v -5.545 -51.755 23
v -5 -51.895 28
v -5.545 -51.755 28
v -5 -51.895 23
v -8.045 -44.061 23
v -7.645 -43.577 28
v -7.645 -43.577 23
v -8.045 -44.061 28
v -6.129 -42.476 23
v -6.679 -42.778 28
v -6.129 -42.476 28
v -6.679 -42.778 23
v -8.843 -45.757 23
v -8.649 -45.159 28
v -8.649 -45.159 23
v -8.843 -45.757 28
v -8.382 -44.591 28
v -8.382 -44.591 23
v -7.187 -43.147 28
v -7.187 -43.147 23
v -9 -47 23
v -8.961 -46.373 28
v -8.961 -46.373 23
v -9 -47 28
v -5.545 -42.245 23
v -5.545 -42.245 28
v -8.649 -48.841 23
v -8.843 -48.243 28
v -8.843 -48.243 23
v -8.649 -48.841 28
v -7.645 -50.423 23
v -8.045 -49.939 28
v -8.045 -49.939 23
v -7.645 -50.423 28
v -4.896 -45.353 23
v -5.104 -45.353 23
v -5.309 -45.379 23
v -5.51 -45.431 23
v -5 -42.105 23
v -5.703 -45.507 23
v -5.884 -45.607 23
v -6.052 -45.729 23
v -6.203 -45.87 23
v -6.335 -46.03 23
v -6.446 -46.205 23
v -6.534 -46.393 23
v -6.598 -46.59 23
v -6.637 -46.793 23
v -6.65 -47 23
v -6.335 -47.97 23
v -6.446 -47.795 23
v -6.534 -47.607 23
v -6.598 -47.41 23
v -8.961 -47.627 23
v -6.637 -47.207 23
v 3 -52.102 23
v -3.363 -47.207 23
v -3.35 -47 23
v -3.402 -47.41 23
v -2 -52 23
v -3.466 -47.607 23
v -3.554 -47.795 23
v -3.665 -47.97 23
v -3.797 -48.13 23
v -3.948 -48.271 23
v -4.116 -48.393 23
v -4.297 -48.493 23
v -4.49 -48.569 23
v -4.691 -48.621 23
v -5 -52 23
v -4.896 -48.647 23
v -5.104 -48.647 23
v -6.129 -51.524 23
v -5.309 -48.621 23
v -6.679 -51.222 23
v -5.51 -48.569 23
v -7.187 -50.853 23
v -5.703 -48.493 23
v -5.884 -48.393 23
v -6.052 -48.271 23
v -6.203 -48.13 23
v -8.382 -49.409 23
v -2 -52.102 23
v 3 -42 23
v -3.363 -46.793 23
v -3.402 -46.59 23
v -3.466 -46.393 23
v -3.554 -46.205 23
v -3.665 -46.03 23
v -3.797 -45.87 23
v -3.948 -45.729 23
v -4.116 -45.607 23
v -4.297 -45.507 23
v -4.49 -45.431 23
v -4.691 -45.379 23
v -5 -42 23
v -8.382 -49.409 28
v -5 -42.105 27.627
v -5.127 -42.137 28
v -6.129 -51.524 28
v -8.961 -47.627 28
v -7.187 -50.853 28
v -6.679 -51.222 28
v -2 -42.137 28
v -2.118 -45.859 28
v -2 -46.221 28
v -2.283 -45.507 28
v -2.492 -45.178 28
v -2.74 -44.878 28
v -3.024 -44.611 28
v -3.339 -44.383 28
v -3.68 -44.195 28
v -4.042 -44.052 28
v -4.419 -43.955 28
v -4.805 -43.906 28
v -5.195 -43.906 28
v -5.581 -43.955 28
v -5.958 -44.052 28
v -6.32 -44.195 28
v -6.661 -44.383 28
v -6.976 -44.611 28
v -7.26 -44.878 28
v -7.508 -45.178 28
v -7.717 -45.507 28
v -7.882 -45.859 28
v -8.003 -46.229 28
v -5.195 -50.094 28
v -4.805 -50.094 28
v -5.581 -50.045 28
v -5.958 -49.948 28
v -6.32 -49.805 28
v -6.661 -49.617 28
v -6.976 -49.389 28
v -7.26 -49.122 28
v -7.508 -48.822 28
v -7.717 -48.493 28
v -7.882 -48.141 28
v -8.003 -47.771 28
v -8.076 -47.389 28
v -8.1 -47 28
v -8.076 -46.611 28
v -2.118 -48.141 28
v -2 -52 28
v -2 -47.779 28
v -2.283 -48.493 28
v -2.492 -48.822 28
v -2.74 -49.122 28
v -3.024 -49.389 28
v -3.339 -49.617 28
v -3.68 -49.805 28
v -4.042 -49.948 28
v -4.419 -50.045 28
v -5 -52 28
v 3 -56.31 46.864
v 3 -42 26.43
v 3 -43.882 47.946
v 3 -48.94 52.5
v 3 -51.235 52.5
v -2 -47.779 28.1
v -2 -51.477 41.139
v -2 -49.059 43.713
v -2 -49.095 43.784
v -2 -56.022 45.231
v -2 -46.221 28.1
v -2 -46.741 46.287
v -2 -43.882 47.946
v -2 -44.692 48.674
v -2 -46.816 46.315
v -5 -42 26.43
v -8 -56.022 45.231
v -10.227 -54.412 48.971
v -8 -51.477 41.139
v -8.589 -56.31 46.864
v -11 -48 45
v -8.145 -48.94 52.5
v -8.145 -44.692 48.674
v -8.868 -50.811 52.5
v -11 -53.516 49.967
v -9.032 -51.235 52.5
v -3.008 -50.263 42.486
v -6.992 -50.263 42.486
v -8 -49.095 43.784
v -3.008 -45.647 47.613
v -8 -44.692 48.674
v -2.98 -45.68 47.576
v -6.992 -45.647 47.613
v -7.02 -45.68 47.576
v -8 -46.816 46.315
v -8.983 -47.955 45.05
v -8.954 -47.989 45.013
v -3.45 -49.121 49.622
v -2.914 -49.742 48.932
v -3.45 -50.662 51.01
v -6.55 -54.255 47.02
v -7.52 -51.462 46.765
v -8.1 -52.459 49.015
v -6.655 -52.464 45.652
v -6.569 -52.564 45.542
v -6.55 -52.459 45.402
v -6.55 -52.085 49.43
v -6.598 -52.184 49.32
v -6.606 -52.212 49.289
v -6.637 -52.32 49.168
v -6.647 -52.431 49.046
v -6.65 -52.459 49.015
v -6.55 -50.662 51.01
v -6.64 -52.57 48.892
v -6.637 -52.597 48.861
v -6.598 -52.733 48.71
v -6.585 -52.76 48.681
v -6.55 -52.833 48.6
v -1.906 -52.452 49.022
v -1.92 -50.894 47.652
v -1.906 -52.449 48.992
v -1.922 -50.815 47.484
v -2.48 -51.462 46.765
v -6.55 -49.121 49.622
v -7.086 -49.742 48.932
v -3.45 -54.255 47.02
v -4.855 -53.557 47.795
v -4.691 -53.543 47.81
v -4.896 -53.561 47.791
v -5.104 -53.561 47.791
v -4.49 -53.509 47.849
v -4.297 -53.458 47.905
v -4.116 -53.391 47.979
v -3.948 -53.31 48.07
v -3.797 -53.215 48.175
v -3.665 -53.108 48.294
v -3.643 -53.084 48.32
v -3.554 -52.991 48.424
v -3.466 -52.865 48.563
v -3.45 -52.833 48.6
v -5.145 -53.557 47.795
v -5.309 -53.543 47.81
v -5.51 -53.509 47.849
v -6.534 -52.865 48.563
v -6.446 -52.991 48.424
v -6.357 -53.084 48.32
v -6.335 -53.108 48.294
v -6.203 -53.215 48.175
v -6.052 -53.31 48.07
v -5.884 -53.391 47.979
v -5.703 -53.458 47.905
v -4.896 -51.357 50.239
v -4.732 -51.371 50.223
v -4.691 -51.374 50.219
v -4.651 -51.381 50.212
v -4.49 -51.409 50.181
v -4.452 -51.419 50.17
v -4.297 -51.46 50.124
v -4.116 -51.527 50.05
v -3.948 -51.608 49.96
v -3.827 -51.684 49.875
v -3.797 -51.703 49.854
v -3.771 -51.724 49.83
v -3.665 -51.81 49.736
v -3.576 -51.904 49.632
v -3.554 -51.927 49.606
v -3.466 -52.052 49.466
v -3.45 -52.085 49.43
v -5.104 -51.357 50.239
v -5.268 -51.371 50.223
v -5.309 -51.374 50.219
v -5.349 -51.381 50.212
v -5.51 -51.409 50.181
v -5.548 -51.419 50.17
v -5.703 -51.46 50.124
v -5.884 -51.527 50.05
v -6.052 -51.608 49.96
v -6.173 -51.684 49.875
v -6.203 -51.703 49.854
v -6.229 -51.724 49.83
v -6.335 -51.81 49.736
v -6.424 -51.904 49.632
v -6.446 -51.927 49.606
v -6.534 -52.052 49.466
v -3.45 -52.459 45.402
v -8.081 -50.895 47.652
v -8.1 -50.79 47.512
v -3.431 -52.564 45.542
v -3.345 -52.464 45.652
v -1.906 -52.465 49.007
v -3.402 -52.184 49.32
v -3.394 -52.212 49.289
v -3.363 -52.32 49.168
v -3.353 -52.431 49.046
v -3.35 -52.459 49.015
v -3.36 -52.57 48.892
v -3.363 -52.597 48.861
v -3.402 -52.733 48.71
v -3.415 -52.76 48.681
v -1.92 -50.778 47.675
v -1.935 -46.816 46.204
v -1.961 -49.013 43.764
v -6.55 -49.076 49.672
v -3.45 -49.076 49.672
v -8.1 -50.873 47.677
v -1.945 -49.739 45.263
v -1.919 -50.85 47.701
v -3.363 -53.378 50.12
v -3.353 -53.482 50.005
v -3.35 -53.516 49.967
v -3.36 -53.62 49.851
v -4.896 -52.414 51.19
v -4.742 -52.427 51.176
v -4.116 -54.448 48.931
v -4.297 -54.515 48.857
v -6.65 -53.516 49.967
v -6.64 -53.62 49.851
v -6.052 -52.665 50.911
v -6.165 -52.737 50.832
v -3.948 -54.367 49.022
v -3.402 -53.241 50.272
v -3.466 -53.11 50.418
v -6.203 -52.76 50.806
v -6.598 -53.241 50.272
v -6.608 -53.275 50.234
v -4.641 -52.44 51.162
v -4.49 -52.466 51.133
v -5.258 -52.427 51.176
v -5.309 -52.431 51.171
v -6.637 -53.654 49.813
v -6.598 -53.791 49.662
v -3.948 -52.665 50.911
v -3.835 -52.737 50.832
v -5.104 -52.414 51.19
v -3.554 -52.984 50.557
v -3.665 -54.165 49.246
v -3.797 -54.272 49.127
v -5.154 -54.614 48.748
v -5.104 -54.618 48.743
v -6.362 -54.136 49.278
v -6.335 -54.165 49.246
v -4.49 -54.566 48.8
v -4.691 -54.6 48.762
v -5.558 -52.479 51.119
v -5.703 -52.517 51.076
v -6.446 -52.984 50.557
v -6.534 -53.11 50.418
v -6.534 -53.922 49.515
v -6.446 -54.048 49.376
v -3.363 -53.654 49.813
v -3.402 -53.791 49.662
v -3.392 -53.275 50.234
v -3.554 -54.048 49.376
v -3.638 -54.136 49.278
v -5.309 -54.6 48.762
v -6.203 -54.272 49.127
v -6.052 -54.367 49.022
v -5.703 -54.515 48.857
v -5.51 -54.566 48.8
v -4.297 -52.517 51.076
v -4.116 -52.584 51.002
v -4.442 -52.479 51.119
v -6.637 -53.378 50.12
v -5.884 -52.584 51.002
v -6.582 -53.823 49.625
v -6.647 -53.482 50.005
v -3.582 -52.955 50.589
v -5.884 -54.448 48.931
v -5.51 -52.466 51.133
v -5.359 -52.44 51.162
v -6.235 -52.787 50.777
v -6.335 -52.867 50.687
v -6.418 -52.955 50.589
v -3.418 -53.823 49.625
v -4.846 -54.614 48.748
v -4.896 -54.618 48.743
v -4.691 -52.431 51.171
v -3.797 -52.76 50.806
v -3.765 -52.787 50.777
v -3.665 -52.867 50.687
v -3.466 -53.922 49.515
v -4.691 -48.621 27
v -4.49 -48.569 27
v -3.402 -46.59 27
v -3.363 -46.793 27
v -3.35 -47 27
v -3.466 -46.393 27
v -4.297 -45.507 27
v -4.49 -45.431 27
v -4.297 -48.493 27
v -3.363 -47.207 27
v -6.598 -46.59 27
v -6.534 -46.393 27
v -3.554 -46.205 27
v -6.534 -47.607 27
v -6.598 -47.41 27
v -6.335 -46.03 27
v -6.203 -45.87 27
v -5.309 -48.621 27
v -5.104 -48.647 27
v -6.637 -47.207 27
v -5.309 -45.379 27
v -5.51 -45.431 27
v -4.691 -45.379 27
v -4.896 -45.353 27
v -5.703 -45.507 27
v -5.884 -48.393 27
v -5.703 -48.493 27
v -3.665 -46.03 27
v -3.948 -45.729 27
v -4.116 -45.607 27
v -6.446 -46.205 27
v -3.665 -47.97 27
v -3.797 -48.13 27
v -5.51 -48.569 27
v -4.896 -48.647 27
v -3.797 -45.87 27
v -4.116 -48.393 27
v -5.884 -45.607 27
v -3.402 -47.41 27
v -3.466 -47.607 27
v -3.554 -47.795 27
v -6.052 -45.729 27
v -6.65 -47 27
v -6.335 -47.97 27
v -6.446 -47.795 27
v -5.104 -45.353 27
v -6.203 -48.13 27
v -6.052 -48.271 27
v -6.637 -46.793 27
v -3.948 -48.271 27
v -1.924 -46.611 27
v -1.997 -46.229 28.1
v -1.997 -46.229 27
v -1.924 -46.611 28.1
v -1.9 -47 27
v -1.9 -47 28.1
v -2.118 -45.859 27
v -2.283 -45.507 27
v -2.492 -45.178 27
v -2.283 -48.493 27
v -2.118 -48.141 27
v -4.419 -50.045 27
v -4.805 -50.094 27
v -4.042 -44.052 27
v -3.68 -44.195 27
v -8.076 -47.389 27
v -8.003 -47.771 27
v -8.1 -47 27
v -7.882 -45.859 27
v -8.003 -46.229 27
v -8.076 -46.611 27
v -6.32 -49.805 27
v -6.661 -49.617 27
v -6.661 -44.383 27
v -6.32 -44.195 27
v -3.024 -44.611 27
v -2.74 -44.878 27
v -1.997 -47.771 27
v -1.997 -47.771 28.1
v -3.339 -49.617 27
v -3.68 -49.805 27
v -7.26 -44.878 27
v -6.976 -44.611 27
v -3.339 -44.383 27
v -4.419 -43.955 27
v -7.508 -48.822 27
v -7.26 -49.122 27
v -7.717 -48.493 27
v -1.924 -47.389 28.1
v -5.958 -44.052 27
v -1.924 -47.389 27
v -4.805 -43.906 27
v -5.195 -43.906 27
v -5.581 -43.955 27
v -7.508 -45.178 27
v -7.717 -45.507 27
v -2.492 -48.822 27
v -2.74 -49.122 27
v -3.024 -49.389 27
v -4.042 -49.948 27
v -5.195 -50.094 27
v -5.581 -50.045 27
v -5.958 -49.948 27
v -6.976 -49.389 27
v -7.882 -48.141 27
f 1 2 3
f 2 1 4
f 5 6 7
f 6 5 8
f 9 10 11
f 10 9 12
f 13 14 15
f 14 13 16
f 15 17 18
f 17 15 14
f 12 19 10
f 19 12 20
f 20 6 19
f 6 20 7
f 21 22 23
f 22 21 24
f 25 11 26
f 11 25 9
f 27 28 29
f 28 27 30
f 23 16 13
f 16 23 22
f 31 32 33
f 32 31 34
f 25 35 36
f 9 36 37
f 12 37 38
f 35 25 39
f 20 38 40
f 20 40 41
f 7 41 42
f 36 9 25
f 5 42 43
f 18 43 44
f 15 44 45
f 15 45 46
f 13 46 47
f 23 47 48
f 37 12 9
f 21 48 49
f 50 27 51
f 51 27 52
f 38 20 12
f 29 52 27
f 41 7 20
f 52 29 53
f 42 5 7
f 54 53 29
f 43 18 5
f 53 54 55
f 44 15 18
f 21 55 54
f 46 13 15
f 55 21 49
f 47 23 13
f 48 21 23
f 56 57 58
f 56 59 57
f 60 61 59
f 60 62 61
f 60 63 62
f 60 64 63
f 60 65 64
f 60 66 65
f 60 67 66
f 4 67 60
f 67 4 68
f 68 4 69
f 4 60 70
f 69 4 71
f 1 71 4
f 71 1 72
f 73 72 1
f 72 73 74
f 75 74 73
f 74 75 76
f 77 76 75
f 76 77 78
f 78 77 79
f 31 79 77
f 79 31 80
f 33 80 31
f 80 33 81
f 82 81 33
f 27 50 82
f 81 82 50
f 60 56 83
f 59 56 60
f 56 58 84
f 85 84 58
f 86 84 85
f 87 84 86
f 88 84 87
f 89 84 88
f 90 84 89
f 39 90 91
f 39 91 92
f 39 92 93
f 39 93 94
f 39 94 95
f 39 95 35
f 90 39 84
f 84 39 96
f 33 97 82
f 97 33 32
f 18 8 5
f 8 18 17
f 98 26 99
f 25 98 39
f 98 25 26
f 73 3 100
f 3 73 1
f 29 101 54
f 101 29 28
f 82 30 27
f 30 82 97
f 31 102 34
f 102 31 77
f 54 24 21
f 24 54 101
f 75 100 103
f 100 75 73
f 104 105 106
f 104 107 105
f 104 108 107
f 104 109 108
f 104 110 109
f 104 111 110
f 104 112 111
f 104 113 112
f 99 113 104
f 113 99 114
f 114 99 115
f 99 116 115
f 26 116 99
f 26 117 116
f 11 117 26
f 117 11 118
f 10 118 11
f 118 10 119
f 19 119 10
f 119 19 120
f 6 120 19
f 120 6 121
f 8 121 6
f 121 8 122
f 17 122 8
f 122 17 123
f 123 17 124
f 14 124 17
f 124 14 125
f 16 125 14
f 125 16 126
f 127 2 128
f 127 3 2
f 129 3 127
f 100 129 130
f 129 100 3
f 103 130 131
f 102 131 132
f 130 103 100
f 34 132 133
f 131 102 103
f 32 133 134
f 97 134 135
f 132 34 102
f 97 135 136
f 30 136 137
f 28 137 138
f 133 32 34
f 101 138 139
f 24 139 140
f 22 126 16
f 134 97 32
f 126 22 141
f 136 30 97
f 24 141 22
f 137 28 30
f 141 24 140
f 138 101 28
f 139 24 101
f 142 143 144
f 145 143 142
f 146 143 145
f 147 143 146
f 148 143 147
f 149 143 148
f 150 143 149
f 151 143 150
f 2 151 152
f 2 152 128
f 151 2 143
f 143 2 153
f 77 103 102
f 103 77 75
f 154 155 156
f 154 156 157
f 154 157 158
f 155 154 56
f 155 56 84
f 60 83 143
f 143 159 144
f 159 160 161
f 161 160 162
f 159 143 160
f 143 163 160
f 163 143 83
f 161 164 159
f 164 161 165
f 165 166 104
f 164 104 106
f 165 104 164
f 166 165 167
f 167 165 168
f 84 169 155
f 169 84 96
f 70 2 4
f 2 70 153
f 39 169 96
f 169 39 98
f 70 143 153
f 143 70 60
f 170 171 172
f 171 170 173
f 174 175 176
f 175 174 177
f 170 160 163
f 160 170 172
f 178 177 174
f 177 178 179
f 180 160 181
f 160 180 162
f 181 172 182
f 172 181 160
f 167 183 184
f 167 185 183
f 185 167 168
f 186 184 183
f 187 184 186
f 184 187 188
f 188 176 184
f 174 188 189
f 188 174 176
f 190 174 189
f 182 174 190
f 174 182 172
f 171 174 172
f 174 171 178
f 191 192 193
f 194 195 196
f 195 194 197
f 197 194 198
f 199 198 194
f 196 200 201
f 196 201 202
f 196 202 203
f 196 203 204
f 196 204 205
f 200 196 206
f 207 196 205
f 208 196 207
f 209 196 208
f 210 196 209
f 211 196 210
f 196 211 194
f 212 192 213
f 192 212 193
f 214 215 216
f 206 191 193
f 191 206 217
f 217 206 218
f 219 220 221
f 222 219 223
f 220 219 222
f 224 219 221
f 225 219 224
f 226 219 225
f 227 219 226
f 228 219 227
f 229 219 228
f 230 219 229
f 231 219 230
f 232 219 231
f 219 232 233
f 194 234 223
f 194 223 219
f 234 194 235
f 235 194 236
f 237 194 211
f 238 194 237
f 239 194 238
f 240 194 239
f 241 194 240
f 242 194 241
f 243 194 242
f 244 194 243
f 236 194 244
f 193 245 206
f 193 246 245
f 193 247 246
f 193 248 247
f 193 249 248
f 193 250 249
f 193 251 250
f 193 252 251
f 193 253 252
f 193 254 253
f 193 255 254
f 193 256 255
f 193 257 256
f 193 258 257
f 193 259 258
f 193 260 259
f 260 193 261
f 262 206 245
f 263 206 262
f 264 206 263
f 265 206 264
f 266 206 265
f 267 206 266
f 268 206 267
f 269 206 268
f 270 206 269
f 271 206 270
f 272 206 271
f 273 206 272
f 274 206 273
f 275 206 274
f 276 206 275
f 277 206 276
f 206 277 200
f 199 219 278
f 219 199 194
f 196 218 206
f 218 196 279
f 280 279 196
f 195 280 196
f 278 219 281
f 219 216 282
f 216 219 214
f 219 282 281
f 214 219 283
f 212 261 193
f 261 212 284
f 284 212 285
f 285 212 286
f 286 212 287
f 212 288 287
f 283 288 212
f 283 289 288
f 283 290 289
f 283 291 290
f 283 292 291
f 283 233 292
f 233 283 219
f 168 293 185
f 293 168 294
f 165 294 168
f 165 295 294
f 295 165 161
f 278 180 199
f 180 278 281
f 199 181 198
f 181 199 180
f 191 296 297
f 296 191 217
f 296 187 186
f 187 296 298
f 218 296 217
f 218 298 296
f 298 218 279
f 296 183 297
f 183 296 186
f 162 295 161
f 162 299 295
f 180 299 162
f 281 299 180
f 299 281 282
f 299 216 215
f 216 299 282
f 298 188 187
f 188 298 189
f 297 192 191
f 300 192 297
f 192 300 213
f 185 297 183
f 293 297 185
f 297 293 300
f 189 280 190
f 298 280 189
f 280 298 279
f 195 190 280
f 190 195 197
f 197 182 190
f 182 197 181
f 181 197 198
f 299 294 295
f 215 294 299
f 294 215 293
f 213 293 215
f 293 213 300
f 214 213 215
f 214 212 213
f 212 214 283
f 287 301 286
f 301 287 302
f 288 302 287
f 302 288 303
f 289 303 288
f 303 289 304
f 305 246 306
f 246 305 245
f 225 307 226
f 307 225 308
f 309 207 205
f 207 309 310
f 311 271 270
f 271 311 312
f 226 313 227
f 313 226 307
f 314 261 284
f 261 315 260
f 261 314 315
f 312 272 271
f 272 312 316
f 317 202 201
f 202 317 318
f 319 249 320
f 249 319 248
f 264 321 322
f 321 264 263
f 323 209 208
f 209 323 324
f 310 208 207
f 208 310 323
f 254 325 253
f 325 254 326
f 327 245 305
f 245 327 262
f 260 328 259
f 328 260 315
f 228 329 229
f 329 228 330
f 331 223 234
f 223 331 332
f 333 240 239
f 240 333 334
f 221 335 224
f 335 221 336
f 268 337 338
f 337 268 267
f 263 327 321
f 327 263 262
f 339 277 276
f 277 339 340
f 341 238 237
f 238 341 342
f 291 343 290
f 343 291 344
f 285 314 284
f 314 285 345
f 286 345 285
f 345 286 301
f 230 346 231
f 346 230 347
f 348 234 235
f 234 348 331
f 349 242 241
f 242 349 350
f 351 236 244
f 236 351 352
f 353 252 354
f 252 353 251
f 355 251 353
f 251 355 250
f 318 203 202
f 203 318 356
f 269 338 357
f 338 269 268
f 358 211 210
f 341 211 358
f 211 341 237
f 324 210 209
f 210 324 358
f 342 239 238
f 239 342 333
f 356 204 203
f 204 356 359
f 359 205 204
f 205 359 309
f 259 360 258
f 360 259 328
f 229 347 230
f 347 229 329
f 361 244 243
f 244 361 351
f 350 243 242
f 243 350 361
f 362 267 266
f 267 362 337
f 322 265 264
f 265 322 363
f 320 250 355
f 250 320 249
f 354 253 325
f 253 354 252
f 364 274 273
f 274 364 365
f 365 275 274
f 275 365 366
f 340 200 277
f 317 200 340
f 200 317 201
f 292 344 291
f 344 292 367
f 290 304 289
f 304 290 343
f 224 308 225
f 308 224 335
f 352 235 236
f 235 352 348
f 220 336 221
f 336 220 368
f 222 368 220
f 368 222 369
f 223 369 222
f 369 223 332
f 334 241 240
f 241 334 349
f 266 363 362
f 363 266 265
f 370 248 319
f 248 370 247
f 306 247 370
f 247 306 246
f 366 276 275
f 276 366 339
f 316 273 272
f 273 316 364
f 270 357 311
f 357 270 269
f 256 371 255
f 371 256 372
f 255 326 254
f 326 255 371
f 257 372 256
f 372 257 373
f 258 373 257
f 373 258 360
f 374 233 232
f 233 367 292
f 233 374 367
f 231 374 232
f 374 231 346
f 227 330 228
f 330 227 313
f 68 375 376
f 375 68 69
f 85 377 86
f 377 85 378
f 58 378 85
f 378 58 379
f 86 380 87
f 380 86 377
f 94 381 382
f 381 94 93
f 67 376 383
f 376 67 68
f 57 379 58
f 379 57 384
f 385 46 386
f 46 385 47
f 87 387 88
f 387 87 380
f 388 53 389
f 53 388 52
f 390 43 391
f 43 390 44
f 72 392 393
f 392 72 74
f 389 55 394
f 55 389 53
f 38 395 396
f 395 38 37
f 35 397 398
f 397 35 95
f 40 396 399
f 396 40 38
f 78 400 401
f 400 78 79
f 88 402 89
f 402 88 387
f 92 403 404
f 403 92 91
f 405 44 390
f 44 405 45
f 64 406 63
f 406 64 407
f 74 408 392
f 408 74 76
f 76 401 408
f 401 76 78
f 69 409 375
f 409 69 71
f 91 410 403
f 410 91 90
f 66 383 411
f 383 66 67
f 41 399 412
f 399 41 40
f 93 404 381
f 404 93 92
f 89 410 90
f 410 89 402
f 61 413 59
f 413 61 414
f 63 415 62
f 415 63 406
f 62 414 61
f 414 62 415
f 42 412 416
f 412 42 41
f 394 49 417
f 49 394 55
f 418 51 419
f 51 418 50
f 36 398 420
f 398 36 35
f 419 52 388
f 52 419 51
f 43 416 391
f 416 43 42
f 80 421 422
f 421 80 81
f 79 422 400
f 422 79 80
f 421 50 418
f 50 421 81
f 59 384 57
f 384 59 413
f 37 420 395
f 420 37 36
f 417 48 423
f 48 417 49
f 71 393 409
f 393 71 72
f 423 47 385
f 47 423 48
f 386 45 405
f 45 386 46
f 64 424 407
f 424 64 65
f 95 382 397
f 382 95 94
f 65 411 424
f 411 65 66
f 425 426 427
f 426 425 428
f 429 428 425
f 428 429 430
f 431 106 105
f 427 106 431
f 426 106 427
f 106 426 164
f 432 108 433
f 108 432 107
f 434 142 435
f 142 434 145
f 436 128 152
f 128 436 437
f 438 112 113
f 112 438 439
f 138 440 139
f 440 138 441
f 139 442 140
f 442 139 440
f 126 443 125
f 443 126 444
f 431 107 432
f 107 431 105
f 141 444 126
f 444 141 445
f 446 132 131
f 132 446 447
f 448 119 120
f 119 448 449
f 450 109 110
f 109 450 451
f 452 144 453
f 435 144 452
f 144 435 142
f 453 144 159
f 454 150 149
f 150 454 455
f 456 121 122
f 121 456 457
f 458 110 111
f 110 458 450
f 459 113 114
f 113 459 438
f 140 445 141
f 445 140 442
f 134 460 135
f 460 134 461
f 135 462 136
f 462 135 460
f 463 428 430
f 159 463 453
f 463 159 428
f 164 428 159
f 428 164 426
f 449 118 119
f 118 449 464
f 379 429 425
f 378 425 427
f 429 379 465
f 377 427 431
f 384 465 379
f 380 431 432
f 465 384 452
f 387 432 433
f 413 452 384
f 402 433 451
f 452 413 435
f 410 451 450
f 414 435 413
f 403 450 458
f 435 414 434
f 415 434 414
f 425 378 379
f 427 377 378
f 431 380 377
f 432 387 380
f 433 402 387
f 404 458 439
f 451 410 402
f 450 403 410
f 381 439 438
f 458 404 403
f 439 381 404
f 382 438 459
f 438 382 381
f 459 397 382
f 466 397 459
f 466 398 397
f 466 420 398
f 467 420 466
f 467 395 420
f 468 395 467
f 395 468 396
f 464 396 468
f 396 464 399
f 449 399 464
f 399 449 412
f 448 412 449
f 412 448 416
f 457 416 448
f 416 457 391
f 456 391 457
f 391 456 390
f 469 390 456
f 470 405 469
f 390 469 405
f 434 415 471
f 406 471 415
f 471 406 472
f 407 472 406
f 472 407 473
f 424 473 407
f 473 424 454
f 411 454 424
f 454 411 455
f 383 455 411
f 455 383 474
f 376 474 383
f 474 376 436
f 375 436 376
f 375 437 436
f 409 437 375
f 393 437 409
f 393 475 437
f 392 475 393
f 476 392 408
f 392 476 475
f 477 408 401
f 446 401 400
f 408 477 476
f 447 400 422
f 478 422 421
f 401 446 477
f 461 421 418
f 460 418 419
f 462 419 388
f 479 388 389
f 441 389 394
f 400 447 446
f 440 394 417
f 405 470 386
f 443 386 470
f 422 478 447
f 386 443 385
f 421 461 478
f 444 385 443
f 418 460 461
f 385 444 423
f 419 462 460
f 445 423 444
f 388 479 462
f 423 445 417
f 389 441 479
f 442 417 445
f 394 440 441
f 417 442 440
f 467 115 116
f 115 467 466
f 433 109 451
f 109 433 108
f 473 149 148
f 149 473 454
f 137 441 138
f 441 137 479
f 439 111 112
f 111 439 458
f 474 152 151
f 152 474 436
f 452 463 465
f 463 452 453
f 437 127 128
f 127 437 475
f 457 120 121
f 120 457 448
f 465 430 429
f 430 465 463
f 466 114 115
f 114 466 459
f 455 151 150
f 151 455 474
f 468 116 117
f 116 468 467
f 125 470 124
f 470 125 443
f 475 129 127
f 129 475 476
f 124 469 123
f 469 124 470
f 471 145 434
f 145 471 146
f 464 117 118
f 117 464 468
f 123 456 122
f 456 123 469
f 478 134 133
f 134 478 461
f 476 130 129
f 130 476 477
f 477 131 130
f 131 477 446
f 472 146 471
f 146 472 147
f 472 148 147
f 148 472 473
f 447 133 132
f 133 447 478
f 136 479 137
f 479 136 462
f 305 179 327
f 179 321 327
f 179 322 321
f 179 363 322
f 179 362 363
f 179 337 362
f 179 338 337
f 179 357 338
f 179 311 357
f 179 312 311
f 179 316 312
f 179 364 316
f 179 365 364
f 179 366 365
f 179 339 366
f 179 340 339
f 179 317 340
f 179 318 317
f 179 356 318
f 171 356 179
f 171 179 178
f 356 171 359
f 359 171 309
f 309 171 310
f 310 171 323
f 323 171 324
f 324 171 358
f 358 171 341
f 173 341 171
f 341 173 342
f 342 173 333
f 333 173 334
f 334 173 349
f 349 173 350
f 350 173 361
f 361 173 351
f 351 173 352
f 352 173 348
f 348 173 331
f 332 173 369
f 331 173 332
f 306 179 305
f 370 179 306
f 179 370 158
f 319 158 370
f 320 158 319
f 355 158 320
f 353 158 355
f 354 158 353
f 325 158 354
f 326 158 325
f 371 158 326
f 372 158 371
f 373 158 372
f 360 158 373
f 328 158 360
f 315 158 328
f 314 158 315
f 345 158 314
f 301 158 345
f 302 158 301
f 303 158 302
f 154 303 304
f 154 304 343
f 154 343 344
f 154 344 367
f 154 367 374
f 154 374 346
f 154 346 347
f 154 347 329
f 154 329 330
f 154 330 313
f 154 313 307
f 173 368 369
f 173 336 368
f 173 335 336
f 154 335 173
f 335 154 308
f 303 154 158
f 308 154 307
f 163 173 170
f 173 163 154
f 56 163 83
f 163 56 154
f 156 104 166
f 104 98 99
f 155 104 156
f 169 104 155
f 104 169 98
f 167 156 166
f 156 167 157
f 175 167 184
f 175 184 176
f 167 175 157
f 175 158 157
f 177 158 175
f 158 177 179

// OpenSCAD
// PRUSA iteration4
// Print fan support
// GNU GPL v3
// Josef Průša <iam@josefprusa.cz> and contributors
// http://www.reprap.org/wiki/Prusa_Mendel
// http://prusamendel.org

difference() {
  union() {
    translate([-4, -47, 23]) rotate([0, 0, 0]) cylinder(h=5, r=5, $fn=50);
    translate([-2, -57, 23]) rotate([0, 0, 0]) cube([5, 15, 30]);
    translate([-5, -52, 23]) rotate([0, 0, 0]) cube([8, 10, 5]);
    translate([-5, -48, 45]) rotate([48, 0, 0]) cylinder(h=10, r=6, $fn=6);
  }

  translate([-5, -48, 45]) rotate([48, 0, 0]) cylinder(h=30, r=1.65, $fn=50);

  difference() {
    union() {
      translate([-5, -48, 45]) rotate([48, 0, 0]) cylinder(h=6, r=3.1, $fn=6);
      translate([-5, -47.9, 45]) rotate([48, 0, 0]) cylinder(h=4, r2=3.1, r1=4, $fn=6);
    }
    translate([-2, -55, 40]) rotate([0, 0.6, 0]) cube([10, 10, 10]);
  }
  translate([-5, -47, 10]) rotate([0, 0, 0]) cylinder(h=25, r=1.65, $fn=50);
  translate([-5, -47, 27]) rotate([0, 0, 0]) cylinder(h=1.1, r=3.1, $fn=50);

  translate([10, -85, 15]) rotate([0, -48, 90]) cube([60, 50, 20]);
  translate([-15, -71, 15]) rotate([10, 0, 0]) cube([50, 20, 40]);
  translate([-15, -41, 15]) rotate([5, 0, 0]) cube([50, 20, 40]);
  translate([-15, -39.5, 44]) rotate([48, 0, 0]) cube([20, 20, 20]);
  translate([-15, -60, 52.5]) rotate([0, 0, 0]) cube([20, 20, 20]);
}
